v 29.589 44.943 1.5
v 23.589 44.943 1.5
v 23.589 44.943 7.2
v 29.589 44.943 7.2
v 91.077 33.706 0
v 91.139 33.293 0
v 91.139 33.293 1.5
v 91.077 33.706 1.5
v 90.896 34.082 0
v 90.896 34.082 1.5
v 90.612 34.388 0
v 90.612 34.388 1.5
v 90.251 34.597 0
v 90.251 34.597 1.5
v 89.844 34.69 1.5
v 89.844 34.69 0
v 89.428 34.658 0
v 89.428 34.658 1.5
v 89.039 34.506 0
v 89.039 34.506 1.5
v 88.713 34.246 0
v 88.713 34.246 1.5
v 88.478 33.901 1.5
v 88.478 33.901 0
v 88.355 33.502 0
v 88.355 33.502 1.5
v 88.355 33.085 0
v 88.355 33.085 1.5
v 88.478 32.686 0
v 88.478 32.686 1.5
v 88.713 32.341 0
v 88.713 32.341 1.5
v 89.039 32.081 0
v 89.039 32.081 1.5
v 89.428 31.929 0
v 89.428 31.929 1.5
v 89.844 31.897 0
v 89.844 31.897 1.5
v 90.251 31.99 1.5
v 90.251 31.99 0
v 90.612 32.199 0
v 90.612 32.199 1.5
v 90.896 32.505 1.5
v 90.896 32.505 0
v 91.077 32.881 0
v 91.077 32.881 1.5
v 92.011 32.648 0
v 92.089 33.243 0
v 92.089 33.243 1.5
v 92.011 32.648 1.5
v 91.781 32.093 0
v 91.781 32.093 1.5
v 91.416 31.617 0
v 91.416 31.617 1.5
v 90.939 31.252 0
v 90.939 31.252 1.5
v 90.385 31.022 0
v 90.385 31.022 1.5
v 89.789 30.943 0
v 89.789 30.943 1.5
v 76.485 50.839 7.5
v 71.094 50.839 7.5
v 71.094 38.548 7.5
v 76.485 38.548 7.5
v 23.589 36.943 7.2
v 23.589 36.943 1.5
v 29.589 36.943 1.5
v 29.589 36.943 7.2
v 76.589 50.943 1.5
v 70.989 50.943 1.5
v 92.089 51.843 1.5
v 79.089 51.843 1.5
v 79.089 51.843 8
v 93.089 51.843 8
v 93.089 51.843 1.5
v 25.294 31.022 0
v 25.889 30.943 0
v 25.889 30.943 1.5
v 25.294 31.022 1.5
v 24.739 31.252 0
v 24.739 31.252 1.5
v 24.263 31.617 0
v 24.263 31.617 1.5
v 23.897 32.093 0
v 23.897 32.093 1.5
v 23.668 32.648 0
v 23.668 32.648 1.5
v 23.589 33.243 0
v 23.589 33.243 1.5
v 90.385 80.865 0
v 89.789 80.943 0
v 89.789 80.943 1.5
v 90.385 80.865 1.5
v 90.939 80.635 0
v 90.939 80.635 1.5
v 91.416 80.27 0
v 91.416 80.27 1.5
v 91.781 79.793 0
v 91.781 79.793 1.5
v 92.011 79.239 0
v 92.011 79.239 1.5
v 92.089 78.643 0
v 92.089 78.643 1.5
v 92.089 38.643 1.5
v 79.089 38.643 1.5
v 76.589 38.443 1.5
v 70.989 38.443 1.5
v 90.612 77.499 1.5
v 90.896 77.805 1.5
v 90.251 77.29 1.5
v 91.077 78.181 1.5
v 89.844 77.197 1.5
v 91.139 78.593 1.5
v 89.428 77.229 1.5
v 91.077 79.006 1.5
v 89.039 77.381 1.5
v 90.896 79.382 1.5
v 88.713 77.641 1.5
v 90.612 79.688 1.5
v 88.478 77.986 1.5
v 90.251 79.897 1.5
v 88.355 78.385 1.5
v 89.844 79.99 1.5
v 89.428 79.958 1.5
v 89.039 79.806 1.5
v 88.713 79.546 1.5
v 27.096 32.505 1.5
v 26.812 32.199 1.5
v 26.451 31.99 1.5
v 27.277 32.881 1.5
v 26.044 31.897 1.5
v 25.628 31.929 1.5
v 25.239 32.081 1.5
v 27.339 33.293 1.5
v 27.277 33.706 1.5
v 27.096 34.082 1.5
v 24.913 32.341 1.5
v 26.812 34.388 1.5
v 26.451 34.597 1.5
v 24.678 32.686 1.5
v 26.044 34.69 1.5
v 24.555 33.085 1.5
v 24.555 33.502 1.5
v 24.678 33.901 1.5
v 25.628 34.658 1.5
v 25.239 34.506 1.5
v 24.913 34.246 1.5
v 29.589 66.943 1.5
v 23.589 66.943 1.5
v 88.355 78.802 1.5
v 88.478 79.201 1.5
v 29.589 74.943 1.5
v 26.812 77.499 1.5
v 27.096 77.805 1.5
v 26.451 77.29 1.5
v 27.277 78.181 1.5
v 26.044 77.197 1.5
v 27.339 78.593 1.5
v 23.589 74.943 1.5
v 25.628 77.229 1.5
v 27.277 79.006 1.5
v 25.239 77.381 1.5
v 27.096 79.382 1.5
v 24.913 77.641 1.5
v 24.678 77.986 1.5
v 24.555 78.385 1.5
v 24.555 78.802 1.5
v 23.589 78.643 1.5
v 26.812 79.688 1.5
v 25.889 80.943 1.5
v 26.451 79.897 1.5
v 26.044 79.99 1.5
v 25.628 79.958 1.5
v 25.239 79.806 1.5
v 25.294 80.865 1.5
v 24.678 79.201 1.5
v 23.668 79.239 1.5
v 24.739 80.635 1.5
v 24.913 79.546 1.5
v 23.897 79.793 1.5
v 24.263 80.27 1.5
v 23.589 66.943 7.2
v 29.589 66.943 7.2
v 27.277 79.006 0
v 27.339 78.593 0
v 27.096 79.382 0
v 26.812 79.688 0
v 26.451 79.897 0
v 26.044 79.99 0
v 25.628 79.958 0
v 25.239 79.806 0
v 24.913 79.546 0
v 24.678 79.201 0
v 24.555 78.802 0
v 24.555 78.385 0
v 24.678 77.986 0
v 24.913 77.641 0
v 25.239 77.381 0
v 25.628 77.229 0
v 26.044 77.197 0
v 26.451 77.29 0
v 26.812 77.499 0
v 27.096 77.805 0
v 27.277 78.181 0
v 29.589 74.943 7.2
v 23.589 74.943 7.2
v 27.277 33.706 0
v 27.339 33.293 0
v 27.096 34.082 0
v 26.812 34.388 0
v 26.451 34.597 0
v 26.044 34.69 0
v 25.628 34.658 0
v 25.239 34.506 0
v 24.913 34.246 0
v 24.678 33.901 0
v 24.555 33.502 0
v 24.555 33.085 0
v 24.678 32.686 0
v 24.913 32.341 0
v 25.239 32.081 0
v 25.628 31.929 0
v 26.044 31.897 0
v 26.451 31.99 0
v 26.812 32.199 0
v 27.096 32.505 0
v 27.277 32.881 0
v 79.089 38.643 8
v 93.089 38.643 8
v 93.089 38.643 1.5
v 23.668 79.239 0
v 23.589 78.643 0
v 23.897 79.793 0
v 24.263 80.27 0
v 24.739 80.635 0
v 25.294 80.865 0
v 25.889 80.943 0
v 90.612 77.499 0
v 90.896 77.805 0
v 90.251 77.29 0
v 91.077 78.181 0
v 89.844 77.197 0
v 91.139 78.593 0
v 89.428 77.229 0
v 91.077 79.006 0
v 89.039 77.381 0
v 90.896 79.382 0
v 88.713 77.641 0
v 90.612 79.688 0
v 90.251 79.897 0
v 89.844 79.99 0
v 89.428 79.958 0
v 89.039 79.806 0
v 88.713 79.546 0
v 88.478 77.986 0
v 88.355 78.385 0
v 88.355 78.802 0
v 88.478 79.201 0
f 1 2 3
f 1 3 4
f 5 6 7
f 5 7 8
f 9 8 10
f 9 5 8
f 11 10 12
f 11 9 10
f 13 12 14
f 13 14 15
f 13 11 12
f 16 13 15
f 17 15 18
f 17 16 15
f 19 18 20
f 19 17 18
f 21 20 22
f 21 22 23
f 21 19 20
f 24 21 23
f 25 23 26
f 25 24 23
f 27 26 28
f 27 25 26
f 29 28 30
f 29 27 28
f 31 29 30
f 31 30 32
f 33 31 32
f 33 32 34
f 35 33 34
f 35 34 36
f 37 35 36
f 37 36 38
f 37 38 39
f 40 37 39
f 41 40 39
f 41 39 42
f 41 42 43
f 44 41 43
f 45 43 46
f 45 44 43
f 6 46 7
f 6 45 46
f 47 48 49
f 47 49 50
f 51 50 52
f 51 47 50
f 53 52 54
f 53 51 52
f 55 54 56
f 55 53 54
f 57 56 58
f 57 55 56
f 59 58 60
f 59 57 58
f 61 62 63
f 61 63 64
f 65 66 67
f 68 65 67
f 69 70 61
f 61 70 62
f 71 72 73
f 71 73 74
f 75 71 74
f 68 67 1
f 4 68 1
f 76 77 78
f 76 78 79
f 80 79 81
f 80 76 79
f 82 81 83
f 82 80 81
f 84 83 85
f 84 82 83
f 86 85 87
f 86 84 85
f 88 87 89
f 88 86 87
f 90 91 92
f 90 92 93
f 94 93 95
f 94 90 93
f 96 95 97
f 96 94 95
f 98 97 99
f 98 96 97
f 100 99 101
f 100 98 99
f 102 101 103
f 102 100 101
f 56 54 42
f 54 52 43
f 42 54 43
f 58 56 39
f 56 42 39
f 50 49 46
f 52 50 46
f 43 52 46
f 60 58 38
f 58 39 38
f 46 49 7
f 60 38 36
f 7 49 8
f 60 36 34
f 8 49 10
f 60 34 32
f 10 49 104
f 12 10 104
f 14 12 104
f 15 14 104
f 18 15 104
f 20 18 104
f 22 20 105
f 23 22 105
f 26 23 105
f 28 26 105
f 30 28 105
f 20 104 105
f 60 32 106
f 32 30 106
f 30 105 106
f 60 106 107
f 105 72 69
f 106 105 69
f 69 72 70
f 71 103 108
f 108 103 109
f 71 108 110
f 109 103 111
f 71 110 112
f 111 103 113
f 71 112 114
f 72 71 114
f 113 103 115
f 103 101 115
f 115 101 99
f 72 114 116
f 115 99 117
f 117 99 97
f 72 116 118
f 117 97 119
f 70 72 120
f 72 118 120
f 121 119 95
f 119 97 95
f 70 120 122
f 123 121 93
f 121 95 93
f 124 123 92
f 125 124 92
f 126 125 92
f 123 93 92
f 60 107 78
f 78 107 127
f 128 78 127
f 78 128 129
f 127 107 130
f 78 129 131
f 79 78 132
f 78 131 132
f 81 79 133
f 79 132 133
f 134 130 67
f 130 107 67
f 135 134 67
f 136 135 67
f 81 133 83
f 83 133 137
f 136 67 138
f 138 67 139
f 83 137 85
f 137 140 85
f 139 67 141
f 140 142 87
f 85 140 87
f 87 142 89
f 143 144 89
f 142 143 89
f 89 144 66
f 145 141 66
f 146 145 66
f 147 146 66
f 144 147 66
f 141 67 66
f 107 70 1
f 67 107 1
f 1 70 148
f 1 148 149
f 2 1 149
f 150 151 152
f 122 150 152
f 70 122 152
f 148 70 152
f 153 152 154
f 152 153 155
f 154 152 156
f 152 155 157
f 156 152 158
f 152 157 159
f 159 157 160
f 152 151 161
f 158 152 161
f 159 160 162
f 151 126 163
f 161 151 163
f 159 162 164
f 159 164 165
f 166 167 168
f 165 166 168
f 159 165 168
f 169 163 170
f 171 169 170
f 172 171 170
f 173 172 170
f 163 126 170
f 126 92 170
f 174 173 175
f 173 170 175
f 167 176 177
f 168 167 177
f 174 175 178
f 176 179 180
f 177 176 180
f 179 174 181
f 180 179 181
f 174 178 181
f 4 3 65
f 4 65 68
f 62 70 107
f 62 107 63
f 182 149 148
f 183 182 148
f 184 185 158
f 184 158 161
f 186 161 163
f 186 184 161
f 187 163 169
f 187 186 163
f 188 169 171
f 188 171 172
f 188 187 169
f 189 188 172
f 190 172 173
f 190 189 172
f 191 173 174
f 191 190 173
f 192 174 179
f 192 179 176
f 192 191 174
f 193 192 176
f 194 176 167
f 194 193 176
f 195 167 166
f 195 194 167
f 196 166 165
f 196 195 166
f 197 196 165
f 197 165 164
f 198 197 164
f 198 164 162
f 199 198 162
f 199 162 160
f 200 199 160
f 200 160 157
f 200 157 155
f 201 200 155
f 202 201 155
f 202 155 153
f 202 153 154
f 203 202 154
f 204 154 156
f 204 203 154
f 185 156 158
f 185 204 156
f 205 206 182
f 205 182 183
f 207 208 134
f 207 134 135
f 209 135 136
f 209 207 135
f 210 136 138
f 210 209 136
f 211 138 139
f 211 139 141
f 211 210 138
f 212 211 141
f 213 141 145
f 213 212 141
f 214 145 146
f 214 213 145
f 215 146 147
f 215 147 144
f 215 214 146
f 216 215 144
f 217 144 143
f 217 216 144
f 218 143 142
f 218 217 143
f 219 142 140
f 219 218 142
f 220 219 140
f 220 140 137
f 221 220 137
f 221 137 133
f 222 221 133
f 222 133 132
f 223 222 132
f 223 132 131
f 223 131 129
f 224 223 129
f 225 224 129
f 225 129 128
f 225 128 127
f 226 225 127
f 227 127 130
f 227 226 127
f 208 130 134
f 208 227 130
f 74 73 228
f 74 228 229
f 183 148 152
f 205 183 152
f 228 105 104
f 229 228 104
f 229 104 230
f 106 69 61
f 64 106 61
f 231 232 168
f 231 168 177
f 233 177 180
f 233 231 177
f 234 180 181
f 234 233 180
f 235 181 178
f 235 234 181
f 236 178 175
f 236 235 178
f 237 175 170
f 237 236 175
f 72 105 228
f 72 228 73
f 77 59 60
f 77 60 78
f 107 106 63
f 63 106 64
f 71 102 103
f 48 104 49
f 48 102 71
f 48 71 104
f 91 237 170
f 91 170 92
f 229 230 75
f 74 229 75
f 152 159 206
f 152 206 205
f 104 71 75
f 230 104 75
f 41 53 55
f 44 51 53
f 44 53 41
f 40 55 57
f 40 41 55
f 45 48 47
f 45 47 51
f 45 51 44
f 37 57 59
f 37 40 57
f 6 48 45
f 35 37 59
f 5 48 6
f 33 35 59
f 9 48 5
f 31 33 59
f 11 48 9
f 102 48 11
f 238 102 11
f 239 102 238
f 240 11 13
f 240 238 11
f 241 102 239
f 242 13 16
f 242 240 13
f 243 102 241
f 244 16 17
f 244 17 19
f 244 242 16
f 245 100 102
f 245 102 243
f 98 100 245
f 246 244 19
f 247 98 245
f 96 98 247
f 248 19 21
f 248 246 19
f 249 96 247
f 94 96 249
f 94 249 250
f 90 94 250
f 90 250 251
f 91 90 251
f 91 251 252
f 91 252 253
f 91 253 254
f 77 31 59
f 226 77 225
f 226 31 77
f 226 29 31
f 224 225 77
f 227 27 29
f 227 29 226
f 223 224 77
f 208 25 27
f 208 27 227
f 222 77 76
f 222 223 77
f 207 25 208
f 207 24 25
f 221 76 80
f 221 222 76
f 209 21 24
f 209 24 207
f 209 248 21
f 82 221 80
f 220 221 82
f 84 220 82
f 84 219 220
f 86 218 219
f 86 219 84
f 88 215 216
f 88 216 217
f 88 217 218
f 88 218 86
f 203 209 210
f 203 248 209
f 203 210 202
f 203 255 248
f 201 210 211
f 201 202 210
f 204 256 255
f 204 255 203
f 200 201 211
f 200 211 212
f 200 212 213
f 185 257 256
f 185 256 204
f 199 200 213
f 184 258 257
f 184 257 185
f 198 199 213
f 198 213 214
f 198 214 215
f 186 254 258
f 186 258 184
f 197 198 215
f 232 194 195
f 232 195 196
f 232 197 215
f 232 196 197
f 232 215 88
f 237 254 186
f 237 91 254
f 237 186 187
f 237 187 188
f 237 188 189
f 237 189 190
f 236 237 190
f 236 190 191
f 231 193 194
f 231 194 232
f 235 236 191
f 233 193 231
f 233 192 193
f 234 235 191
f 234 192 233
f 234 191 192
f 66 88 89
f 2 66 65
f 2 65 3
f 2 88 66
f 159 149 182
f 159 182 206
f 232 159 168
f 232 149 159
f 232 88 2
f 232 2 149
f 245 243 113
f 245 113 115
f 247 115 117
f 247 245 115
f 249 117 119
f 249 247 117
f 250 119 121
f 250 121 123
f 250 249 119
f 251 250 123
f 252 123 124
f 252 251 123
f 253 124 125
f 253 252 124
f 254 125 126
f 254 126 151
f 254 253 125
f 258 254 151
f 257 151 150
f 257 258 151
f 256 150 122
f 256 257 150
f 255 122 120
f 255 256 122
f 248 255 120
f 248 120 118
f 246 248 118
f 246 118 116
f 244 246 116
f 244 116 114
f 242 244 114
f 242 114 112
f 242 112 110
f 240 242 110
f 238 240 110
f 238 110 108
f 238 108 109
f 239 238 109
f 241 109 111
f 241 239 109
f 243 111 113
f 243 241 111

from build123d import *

# Parameters (mm, degrees)
SKETCH_1_R      = 1.4
EXTRUDE_1_DEPTH = 1.5
SKETCH_2_W      = 14
SKETCH_2_H      = 13.2
EXTRUDE_2_DEPTH = 6.5
SKETCH_3_W      = 5.6
SKETCH_3_H      = 12.5
EXTRUDE_3_DEPTH = 6
EXTRUDE_3_TAPER = 1
SKETCH_4_W      = 6
SKETCH_4_H      = 8
EXTRUDE_4_DEPTH = 5.7


with BuildPart() as part:
    # 草圖1 → 填料-伸長1 (new body)
    with BuildSketch(Plane.XY):
        with BuildLine():
            Line((25.889258578, 80.943460251), (89.789258578, 80.943460251))
            ThreePointArc((89.789258578, 80.943460251), (91.415604175, 80.269805848), (92.089258578, 78.643460251))
            Line((92.089258578, 78.643460251), (92.089258578, 33.243460251))
            ThreePointArc((92.089258578, 33.243460251), (91.415604175, 31.617114655), (89.789258578, 30.943460251))
            Line((89.789258578, 30.943460251), (25.889258578, 30.943460251))
            ThreePointArc((25.889258578, 30.943460251), (24.262912981, 31.617114655), (23.589258578, 33.243460251))
            Line((23.589258578, 33.243460251), (23.589258578, 78.643460251))
            ThreePointArc((23.589258578, 78.643460251), (24.262912981, 80.269805848), (25.889258578, 80.943460251))
        make_face()
        with Locations((25.939258578, 78.593460251)):
            Circle(SKETCH_1_R, mode=Mode.SUBTRACT)
        with Locations((25.939258578, 33.293460251)):
            Circle(SKETCH_1_R, mode=Mode.SUBTRACT)
        with Locations((89.739258578, 33.293460251)):
            Circle(SKETCH_1_R, mode=Mode.SUBTRACT)
        with Locations((89.739258578, 78.593460251)):
            Circle(SKETCH_1_R, mode=Mode.SUBTRACT)
    extrude(amount=EXTRUDE_1_DEPTH)

    # 草圖2 → 填料-伸長2 (add)
    with BuildSketch(Plane.XY.offset(1.5)):
        with Locations((86.089258578, 45.243460251)):
            Rectangle(SKETCH_2_W, SKETCH_2_H)
    extrude(amount=EXTRUDE_2_DEPTH)

    # 草圖3 → 填料-伸長3 (add)
    with BuildSketch(Plane.XY.offset(1.5)):
        with Locations((73.789258578, 44.693460251)):
            Rectangle(SKETCH_3_W, SKETCH_3_H)
    extrude(amount=EXTRUDE_3_DEPTH, taper=EXTRUDE_3_TAPER)

    # 草圖4 → 填料-伸長4 (add)
    with BuildSketch(Plane.XY.offset(1.5)):
        with Locations((26.589258578, 70.943460251)):
            Rectangle(SKETCH_4_W, SKETCH_4_H)
        with Locations((26.589258578, 40.943460251)):
            Rectangle(SKETCH_4_W, SKETCH_4_H)
    extrude(amount=EXTRUDE_4_DEPTH)


solid = part.part
